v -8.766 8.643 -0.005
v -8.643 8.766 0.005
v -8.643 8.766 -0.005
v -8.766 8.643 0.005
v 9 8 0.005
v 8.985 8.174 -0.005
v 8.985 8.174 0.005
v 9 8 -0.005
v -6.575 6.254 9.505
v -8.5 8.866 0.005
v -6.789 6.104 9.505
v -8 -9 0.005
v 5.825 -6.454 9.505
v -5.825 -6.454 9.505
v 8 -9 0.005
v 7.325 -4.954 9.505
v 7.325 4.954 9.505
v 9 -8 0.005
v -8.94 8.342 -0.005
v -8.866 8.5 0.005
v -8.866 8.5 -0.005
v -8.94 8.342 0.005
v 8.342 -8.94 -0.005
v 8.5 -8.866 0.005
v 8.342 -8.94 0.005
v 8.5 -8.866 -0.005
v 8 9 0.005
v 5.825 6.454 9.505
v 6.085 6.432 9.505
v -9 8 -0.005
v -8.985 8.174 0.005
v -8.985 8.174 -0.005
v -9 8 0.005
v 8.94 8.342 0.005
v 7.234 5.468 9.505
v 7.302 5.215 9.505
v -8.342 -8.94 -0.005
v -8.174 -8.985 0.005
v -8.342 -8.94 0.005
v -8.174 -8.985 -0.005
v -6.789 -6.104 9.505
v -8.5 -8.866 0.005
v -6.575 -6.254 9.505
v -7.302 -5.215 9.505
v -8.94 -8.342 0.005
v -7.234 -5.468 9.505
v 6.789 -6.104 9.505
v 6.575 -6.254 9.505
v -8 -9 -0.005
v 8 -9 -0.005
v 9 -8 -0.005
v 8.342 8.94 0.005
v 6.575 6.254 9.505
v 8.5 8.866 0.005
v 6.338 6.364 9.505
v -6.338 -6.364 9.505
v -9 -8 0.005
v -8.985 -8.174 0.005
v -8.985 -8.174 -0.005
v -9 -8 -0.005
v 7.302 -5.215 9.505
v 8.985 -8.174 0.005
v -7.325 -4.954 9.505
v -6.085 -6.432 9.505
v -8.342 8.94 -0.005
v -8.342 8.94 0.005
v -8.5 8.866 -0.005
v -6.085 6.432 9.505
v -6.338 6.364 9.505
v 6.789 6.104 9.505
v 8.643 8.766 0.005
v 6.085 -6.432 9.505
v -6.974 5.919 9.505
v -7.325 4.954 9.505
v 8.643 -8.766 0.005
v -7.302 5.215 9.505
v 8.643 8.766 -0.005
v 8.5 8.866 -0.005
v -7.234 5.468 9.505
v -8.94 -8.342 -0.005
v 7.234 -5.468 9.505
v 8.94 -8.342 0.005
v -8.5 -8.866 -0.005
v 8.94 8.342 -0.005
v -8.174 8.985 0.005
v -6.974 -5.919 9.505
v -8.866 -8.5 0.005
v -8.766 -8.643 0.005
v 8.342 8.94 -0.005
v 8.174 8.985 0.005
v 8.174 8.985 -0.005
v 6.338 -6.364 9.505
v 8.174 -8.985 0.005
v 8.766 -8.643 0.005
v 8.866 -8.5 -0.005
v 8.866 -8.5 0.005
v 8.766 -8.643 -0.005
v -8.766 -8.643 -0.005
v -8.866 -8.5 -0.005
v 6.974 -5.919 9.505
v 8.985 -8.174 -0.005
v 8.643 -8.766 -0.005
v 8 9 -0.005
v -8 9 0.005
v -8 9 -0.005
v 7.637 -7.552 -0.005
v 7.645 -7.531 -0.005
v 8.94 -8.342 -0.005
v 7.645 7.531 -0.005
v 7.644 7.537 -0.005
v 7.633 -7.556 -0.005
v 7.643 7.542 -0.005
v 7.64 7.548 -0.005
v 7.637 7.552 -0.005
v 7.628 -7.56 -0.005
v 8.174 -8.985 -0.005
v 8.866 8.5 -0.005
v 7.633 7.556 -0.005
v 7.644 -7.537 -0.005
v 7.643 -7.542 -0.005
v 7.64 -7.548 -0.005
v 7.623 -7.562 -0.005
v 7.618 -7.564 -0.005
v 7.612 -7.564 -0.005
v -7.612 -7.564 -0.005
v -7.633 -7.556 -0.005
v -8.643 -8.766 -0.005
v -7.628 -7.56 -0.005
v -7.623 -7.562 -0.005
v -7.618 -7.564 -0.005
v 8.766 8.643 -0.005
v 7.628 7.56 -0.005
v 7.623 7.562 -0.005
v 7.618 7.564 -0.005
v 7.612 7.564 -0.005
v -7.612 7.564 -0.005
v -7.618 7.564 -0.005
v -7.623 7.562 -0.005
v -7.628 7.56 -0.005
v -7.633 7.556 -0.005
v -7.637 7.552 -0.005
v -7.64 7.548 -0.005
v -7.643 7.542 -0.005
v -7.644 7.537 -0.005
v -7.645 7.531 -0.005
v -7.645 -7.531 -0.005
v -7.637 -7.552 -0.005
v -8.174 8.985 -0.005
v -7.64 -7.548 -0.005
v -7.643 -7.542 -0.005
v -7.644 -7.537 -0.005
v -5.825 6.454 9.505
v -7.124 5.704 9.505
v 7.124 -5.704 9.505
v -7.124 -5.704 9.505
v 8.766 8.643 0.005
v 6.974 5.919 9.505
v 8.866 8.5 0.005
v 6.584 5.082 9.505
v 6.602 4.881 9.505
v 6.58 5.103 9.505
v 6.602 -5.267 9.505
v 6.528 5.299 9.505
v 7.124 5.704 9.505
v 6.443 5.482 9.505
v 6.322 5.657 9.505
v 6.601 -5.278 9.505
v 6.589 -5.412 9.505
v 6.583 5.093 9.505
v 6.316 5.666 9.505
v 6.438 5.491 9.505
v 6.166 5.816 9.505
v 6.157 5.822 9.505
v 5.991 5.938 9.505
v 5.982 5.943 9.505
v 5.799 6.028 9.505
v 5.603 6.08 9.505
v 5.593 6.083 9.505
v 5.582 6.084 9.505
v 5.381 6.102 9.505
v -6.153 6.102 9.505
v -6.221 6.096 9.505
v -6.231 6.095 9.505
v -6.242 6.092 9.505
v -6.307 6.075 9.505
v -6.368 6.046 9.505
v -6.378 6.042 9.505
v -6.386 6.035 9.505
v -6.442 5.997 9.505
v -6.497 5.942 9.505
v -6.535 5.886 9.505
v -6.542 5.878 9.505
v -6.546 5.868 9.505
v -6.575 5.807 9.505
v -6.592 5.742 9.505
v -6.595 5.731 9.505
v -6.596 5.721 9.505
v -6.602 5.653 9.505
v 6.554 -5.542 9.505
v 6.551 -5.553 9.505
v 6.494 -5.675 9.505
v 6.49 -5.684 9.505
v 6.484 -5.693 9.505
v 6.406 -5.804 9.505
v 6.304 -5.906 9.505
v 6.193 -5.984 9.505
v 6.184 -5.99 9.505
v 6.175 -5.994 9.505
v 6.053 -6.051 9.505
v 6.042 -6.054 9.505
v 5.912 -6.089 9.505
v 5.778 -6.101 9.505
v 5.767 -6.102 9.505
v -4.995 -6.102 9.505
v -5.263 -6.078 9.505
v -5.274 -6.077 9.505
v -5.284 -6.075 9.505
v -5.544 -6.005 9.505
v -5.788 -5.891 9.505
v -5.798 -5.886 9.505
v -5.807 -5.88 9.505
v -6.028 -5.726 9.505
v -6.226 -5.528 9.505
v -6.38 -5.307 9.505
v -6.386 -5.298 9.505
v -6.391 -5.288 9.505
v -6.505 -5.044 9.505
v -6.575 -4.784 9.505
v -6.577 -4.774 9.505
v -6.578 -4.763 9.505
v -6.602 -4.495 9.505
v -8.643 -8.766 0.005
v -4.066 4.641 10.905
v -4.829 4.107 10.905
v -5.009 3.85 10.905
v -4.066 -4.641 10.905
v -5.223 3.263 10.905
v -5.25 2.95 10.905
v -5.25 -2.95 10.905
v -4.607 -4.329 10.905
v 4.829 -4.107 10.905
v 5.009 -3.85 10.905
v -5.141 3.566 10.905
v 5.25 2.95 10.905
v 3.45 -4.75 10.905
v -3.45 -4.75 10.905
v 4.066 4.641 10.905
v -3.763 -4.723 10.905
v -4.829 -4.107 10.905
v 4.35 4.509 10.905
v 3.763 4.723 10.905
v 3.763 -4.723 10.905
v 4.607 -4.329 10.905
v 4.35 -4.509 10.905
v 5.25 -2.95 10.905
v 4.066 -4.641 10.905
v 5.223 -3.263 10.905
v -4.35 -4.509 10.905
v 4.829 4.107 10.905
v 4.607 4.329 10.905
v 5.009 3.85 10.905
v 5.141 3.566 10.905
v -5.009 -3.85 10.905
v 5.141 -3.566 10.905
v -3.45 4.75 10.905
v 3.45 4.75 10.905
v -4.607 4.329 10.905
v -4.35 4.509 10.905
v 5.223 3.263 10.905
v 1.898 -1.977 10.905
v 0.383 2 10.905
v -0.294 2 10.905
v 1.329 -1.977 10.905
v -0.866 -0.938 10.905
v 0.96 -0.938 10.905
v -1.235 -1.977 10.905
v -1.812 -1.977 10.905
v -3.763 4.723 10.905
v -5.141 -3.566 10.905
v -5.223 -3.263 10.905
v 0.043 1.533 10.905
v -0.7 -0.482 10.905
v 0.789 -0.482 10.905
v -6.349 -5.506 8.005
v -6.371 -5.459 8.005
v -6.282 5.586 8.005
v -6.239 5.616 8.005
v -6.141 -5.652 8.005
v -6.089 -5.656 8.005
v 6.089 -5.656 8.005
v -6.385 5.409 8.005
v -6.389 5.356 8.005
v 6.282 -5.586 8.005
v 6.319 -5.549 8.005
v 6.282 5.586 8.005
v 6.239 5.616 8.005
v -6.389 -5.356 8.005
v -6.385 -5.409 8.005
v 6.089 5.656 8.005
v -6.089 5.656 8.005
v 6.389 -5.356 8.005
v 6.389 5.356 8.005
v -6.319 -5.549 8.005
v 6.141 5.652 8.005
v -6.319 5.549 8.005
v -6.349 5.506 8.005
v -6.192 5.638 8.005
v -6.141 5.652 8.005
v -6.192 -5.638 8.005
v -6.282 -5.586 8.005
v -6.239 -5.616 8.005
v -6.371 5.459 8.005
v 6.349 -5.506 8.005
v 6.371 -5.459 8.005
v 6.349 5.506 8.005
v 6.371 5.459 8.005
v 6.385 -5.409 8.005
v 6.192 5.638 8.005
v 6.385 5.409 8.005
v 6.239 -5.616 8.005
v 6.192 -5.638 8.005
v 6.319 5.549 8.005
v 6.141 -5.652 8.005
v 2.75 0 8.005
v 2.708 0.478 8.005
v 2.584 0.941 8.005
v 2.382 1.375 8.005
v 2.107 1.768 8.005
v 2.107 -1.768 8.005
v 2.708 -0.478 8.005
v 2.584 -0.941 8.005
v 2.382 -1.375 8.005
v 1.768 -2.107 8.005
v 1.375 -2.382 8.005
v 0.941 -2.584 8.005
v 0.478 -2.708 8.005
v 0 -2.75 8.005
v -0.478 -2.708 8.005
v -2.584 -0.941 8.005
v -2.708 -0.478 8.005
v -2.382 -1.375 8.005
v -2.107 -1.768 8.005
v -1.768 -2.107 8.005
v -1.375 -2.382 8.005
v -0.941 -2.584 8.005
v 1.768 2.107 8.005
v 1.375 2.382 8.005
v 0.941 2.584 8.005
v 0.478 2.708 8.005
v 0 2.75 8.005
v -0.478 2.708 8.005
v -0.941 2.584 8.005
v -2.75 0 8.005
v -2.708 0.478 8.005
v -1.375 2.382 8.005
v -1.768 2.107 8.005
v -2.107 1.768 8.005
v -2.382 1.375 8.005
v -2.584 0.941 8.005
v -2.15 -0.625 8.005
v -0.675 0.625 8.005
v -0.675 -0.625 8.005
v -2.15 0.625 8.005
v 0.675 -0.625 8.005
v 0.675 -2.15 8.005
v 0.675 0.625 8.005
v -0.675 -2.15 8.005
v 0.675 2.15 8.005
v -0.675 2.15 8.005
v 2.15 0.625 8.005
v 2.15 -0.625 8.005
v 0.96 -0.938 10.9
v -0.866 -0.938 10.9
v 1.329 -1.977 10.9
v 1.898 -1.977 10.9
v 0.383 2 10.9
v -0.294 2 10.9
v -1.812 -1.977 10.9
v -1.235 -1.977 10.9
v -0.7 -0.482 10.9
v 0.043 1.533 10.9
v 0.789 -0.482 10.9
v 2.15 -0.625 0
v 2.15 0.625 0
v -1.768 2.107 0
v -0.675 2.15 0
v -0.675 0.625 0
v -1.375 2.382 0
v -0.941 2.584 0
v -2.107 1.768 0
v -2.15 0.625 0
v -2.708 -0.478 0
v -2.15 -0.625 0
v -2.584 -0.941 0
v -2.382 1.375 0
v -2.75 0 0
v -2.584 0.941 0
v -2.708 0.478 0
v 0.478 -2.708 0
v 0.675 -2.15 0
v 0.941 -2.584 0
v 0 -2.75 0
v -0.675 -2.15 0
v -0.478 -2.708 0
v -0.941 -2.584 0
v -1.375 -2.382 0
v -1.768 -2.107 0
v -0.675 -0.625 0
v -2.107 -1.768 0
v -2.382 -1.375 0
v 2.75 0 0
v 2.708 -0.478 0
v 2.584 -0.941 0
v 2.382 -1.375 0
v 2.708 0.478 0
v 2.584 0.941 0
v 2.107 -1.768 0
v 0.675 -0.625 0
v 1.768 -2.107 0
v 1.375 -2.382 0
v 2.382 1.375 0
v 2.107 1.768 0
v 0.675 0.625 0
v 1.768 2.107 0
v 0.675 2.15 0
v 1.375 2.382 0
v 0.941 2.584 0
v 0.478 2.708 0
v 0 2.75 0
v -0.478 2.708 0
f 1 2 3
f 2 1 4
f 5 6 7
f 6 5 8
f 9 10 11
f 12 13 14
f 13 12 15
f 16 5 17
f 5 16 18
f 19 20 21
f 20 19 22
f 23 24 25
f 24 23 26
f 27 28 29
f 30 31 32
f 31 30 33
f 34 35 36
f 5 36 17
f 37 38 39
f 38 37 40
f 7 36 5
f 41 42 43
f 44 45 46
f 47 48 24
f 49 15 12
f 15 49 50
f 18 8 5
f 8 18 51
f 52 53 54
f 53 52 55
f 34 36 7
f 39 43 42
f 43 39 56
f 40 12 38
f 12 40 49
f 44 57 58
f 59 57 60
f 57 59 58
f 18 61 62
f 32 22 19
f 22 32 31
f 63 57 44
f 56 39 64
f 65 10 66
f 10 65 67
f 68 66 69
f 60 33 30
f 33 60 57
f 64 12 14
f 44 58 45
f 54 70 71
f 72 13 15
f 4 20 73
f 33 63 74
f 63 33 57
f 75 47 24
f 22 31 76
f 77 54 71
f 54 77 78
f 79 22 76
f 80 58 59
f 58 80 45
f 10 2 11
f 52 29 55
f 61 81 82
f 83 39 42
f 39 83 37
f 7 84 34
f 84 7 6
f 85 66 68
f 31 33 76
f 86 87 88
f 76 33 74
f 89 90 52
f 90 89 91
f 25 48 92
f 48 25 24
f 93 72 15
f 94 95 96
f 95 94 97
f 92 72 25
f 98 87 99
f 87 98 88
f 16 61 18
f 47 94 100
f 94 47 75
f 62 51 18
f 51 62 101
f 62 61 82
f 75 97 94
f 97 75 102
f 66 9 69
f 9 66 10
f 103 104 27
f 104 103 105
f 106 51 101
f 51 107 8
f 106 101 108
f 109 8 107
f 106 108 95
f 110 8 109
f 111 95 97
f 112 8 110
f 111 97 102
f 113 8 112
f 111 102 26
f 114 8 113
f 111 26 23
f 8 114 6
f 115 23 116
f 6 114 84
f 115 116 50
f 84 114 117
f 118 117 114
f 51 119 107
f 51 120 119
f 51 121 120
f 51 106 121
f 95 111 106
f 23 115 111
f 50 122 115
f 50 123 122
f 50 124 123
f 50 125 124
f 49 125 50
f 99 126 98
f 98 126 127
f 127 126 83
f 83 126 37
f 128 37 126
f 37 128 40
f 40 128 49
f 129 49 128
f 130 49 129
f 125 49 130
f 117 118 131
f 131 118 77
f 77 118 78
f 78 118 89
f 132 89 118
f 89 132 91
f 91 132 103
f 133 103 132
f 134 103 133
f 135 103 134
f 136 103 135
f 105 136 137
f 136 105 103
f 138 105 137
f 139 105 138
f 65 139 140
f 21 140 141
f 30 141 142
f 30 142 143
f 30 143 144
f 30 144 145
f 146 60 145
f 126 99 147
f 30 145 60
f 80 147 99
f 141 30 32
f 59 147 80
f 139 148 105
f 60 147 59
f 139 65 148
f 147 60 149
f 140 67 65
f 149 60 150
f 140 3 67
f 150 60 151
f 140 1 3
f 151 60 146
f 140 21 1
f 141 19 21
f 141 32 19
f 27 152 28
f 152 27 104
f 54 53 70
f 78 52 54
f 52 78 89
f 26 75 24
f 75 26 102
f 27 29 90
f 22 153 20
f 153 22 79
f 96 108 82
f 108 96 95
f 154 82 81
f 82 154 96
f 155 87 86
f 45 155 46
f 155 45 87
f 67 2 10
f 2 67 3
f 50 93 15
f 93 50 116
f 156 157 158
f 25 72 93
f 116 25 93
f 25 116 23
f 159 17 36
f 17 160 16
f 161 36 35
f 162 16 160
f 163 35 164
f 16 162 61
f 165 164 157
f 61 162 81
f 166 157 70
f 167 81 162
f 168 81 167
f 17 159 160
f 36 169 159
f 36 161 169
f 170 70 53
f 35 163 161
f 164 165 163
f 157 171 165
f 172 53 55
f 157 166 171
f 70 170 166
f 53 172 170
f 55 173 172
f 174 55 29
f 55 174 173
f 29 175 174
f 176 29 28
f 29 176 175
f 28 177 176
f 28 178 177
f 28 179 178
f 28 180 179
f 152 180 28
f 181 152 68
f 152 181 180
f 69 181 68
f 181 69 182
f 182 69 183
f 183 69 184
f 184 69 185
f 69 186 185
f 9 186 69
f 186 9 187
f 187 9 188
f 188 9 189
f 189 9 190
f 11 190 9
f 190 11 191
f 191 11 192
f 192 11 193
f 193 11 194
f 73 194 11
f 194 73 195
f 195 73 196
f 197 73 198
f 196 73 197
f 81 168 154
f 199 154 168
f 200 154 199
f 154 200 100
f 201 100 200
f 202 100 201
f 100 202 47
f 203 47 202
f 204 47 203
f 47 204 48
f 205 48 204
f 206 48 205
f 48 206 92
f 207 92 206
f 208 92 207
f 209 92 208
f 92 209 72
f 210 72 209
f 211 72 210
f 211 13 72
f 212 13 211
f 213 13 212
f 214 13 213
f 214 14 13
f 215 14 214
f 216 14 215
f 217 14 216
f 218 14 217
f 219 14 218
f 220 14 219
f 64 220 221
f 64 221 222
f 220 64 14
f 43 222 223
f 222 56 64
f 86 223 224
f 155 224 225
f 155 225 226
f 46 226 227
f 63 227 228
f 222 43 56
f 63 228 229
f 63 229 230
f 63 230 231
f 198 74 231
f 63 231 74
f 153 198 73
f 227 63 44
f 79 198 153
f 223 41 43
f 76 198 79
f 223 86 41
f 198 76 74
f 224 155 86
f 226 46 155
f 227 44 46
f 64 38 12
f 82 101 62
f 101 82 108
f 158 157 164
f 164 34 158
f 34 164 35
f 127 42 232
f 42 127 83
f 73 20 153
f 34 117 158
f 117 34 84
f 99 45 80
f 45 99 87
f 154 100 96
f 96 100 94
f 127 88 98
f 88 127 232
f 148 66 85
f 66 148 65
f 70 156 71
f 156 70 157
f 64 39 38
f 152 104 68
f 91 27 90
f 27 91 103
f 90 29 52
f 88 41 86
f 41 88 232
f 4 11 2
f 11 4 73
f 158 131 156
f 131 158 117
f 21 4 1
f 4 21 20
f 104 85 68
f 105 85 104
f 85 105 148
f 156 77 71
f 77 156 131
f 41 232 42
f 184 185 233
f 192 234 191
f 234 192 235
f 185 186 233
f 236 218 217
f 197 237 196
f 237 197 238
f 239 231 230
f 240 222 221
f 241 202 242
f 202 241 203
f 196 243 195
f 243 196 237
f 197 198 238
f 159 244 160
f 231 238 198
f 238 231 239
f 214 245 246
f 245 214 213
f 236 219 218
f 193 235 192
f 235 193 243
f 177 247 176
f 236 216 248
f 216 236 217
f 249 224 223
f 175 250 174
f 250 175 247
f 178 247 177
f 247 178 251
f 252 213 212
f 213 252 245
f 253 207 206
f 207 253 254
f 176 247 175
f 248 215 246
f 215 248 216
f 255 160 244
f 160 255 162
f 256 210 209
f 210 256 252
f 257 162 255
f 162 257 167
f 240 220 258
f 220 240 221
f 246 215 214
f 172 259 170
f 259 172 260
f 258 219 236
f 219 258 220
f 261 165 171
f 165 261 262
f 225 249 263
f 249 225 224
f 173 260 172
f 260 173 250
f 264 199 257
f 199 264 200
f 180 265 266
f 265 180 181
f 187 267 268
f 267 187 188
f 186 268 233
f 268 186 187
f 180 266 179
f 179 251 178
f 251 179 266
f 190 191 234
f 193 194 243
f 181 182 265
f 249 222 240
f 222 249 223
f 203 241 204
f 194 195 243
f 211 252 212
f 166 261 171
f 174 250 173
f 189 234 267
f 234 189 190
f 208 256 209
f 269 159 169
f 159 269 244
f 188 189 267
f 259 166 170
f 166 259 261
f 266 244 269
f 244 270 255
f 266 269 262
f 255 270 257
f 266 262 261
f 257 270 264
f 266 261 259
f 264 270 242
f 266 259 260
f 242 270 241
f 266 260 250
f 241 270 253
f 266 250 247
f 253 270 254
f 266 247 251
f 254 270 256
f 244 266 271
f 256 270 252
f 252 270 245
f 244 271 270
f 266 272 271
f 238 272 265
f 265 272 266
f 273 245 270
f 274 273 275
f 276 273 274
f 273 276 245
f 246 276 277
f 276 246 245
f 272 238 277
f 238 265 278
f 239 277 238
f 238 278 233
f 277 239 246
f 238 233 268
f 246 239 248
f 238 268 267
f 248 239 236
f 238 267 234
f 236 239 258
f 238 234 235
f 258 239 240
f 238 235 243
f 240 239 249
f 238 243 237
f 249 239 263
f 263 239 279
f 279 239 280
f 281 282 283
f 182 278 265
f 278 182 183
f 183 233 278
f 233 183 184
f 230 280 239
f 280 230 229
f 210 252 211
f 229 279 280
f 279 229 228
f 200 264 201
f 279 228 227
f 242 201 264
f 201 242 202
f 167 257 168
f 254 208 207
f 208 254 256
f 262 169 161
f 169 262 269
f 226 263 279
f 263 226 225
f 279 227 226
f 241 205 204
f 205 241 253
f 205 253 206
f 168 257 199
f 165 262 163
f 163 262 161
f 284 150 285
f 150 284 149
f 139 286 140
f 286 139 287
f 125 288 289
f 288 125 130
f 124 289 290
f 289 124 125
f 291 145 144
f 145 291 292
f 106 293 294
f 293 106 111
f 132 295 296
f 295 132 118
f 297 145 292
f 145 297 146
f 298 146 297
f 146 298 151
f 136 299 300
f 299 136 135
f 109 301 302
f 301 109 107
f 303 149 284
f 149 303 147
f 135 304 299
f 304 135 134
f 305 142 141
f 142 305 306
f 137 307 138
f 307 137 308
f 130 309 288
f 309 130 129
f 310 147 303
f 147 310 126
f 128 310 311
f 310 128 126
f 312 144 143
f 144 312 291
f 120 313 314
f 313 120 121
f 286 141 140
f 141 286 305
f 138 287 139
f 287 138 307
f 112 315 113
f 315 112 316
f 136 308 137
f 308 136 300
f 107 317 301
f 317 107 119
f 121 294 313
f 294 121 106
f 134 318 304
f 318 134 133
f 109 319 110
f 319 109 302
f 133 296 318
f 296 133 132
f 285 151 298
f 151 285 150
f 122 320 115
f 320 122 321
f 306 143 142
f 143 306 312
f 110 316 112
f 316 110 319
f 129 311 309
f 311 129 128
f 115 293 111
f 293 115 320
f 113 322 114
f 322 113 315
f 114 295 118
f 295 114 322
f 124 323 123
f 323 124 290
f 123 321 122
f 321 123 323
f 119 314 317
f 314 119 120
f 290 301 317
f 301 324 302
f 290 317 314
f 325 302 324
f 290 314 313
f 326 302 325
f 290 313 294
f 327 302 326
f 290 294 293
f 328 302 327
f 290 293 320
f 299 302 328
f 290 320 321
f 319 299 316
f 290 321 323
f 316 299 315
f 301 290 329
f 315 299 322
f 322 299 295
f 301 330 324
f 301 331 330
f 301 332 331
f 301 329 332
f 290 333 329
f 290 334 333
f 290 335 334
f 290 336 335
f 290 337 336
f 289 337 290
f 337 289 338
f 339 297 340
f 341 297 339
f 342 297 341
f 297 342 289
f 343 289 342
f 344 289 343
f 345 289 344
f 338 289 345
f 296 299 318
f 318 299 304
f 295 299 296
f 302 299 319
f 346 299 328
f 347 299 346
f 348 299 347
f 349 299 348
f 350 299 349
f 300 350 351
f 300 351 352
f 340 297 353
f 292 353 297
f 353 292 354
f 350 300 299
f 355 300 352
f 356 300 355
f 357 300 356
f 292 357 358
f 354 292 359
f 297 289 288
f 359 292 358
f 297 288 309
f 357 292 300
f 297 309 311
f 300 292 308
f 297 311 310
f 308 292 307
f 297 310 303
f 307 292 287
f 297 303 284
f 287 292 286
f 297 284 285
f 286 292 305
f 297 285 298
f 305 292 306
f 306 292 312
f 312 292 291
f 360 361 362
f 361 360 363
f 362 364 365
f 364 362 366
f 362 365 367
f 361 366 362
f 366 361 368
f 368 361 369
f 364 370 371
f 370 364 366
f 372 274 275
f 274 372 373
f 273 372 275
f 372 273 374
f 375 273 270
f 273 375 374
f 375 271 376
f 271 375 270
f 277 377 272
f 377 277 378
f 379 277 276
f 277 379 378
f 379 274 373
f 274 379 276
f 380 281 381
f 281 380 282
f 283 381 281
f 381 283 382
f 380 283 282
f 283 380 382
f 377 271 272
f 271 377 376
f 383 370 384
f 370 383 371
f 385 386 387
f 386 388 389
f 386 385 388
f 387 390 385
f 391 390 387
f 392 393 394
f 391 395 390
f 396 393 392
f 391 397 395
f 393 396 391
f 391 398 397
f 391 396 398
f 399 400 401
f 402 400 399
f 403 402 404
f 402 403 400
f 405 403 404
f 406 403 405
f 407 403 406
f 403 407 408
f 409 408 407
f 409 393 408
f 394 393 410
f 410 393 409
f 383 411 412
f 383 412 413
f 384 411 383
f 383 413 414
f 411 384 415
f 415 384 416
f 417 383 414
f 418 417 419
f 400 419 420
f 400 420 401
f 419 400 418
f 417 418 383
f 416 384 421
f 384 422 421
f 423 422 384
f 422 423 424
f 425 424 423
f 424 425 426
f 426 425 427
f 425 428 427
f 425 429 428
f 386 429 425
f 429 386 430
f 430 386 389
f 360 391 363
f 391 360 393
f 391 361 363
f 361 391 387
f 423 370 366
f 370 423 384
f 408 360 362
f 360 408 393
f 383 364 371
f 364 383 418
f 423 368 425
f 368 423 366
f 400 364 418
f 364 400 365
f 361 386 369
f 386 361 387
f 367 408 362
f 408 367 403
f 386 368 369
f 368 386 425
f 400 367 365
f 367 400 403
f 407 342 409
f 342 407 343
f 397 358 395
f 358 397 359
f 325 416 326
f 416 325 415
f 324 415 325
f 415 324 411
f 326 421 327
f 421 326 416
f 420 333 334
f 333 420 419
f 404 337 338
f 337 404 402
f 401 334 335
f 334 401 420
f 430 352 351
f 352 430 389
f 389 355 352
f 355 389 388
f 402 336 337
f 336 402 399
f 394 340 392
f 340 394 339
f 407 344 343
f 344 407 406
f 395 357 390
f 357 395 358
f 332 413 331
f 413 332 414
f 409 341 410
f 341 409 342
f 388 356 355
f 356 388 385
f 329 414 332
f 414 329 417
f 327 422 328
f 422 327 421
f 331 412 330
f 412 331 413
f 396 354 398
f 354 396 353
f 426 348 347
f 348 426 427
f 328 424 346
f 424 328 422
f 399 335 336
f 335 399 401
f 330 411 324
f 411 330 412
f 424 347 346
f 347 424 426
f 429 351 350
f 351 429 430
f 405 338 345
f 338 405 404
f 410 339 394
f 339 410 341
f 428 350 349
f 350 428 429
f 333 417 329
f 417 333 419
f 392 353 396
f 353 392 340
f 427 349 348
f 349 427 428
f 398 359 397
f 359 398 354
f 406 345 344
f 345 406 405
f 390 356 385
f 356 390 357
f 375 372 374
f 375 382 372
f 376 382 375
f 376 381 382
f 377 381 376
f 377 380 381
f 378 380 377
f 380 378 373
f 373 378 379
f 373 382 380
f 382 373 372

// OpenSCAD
export_target = "preview";
include <common/custom-shell-params.scad>

user_top_hat_enabled = true;
user_top_hat_top_width = 10.5;
user_top_hat_top_depth = 9.5;
user_top_hat_bottom_width = 13.3;
user_top_hat_bottom_depth = 12.3;
user_top_hat_top_radius = 1.8;
user_top_hat_bottom_radius = 0.8;
user_top_hat_bottom_radius_individual_enabled = true;
// [left_top, right_top, right_bottom, left_bottom]
user_top_hat_bottom_radii = [0.4, 1.2, 0.8, 1.6];
user_top_hat_height = 1.4;
user_top_hat_shoulder_angle = 45;
user_top_hat_shoulder_radius = 0;

include <../base/keycap.scad>
